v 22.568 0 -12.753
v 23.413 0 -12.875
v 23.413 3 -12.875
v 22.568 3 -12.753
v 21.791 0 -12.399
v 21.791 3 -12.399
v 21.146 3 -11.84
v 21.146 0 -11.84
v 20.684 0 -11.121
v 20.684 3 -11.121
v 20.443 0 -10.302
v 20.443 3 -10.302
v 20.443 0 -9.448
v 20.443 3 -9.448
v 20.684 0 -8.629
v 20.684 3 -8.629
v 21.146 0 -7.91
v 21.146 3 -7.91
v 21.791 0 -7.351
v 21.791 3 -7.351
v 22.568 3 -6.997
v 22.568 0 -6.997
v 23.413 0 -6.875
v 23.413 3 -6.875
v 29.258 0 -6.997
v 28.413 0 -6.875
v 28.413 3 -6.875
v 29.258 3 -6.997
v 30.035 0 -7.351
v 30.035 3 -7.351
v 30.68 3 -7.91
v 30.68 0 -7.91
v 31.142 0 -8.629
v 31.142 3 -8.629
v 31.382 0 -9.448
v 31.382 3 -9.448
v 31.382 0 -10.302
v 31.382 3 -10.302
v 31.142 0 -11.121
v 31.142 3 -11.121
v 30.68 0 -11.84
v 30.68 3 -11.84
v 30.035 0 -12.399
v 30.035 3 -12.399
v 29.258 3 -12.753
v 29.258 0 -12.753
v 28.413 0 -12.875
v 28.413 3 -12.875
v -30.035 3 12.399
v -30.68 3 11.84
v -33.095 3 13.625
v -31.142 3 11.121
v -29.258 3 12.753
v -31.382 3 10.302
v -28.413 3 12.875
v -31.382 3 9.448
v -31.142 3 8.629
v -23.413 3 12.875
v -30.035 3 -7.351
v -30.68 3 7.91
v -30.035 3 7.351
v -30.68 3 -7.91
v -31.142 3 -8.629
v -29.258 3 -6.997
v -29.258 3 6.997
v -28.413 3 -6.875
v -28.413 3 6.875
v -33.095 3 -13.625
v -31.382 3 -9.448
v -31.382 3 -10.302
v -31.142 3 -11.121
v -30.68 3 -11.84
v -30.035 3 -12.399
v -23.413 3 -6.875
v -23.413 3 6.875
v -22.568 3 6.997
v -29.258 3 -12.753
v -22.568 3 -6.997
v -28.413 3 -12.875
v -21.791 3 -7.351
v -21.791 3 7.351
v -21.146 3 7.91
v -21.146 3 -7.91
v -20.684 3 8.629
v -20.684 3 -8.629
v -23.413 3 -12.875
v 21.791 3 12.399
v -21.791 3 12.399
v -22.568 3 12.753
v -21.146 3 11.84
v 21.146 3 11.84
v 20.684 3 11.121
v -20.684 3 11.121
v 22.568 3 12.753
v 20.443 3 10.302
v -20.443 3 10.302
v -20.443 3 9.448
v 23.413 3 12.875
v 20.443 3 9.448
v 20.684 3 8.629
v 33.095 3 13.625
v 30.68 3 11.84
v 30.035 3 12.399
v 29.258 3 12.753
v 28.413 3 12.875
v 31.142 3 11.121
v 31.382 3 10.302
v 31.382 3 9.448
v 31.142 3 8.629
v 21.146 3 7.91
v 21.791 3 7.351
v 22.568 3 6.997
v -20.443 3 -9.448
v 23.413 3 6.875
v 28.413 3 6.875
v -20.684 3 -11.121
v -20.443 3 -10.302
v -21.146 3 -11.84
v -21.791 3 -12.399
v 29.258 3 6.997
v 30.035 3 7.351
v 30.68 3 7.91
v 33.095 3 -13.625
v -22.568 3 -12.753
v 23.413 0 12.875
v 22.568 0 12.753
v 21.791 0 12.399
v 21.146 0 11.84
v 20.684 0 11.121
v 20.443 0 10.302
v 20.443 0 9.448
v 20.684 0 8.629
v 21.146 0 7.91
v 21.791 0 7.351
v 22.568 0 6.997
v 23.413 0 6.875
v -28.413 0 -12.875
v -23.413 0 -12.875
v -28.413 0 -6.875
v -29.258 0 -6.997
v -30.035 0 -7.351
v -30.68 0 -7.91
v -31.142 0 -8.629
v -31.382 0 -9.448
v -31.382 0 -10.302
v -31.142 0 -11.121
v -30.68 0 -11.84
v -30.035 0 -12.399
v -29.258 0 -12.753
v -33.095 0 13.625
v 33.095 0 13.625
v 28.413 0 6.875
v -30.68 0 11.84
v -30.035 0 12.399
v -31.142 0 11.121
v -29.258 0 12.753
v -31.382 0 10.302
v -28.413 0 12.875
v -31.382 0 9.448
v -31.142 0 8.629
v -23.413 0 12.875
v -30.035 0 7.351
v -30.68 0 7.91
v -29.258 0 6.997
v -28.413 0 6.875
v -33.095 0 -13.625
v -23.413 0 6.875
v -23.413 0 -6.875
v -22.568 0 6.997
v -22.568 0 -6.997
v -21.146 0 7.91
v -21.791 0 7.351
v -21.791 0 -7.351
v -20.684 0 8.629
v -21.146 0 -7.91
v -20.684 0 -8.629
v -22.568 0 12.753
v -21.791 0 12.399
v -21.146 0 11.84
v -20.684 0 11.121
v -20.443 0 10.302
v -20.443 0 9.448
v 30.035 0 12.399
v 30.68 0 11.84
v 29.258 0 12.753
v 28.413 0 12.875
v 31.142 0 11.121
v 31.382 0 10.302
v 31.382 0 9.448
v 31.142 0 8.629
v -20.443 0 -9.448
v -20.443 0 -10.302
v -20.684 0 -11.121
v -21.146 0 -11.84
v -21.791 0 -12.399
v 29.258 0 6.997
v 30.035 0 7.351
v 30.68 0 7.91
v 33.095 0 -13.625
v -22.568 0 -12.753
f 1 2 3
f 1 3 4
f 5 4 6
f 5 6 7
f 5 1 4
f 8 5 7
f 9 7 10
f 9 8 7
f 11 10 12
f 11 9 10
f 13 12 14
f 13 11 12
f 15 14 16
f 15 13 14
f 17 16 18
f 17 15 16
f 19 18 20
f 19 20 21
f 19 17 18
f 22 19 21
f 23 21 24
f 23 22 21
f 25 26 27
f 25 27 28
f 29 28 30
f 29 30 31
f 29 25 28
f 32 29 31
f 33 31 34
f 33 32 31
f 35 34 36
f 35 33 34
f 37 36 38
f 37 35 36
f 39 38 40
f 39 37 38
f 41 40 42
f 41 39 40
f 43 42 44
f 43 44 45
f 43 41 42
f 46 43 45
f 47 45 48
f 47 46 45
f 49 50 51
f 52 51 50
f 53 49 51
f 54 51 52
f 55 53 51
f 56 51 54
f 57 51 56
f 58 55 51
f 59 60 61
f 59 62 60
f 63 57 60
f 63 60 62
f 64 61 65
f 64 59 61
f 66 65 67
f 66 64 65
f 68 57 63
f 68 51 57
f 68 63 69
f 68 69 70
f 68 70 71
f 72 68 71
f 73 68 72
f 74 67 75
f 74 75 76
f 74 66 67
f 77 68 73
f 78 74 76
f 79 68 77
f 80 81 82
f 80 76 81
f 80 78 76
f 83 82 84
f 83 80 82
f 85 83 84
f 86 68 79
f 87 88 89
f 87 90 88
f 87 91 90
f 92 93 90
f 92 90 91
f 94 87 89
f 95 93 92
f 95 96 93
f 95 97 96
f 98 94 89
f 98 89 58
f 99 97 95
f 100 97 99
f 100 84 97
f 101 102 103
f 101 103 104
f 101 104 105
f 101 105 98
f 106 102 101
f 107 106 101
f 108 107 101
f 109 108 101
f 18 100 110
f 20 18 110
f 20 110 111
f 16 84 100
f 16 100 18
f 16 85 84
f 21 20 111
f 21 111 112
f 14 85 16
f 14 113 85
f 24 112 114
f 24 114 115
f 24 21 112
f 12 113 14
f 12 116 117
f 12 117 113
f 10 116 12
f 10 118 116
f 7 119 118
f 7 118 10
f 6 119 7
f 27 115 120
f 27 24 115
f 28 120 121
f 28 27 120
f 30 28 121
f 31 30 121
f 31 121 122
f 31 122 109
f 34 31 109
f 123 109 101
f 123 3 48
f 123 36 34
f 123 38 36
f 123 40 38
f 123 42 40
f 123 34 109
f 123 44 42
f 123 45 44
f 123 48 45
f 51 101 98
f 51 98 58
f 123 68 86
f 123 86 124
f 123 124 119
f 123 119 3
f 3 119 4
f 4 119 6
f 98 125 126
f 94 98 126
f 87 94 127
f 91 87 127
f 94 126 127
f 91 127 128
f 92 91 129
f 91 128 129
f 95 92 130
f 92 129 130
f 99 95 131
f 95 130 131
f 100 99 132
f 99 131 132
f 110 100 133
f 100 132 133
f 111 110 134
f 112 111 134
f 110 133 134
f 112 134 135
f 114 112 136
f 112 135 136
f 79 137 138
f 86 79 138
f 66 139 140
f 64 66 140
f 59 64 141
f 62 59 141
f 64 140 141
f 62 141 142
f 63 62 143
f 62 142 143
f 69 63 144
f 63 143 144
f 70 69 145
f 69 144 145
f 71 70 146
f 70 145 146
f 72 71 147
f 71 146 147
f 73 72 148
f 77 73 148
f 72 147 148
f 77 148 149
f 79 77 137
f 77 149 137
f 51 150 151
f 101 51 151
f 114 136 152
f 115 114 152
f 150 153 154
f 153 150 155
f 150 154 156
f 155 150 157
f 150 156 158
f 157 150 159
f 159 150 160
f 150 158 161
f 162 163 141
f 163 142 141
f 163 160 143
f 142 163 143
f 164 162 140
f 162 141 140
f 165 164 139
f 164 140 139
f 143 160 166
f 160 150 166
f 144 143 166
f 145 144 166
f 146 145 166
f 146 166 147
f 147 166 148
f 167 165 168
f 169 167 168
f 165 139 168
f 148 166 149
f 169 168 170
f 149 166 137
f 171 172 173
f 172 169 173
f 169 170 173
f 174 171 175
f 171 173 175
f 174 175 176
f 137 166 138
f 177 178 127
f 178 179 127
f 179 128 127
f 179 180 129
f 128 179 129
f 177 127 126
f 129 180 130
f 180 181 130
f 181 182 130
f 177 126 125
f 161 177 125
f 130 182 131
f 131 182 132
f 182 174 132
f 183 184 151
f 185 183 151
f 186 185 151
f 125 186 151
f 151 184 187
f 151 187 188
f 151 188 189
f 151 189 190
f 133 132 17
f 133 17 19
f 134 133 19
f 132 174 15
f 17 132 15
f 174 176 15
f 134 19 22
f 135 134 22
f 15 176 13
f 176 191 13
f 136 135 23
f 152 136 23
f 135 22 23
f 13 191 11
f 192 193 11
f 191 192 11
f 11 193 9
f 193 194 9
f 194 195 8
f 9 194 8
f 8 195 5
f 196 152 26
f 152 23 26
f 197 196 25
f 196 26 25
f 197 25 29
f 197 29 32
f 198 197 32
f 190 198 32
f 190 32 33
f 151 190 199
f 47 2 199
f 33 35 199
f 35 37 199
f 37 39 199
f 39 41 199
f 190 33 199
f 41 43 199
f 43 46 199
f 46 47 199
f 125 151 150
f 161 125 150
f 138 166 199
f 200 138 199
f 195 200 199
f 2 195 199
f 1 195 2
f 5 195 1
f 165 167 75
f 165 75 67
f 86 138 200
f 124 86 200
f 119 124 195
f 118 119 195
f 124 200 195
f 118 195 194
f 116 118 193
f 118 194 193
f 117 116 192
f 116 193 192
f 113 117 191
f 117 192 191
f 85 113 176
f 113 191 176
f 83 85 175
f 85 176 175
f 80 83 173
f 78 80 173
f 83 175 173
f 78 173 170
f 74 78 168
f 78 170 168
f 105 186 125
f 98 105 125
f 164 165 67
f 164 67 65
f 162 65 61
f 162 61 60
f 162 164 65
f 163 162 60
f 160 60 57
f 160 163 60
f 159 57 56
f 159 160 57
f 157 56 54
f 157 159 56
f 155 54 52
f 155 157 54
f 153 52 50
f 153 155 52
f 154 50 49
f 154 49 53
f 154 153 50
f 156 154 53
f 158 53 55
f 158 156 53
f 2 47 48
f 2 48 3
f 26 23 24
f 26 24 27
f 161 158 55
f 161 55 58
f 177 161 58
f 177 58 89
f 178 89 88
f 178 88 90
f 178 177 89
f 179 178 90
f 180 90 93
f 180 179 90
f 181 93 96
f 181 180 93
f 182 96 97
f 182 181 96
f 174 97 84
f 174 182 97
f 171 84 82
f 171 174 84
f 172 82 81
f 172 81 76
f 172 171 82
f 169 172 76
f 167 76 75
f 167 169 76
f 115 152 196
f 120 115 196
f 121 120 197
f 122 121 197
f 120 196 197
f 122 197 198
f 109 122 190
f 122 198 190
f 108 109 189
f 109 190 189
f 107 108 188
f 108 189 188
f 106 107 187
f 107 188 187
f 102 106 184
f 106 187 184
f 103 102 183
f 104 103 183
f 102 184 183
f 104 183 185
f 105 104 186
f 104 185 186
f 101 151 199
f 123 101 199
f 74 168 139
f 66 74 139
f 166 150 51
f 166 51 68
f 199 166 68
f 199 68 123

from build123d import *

# Parameters (mm, degrees)
SKETCH_1_W      = 66.19
SKETCH_1_H      = 27.25
EXTRUDE_1_DEPTH = 3


with BuildPart() as part:
    # 草图1 → 凸台-拉伸1 (new body)
    with BuildSketch(Plane(origin=(0, 0, 0), x_dir=(1, 0, 0), z_dir=(0, 1, 0))):
        Rectangle(SKETCH_1_W, SKETCH_1_H)
        with BuildLine():
            Line((-28.41294438, 12.875), (-23.41294438, 12.875))
            ThreePointArc((-23.41294438, 12.875), (-20.41294438, 9.875), (-23.41294438, 6.875))
            Line((-23.41294438, 6.875), (-28.41294438, 6.875))
            ThreePointArc((-28.41294438, 6.875), (-31.41294438, 9.875), (-28.41294438, 12.875))
        make_face(mode=Mode.SUBTRACT)
        with BuildLine():
            Line((28.41294438, 12.875), (23.41294438, 12.875))
            ThreePointArc((23.41294438, 12.875), (20.41294438, 9.875), (23.41294438, 6.875))
            Line((23.41294438, 6.875), (28.41294438, 6.875))
            ThreePointArc((28.41294438, 6.875), (31.41294438, 9.875), (28.41294438, 12.875))
        make_face(mode=Mode.SUBTRACT)
        with BuildLine():
            Line((-28.41294438, -12.875), (-23.41294438, -12.875))
            ThreePointArc((-23.41294438, -12.875), (-20.41294438, -9.875), (-23.41294438, -6.875))
            Line((-23.41294438, -6.875), (-28.41294438, -6.875))
            ThreePointArc((-28.41294438, -6.875), (-31.41294438, -9.875), (-28.41294438, -12.875))
        make_face(mode=Mode.SUBTRACT)
        with BuildLine():
            Line((28.41294438, -12.875), (23.41294438, -12.875))
            ThreePointArc((23.41294438, -12.875), (20.41294438, -9.875), (23.41294438, -6.875))
            Line((23.41294438, -6.875), (28.41294438, -6.875))
            ThreePointArc((28.41294438, -6.875), (31.41294438, -9.875), (28.41294438, -12.875))
        make_face(mode=Mode.SUBTRACT)
    extrude(amount=EXTRUDE_1_DEPTH)


solid = part.part
